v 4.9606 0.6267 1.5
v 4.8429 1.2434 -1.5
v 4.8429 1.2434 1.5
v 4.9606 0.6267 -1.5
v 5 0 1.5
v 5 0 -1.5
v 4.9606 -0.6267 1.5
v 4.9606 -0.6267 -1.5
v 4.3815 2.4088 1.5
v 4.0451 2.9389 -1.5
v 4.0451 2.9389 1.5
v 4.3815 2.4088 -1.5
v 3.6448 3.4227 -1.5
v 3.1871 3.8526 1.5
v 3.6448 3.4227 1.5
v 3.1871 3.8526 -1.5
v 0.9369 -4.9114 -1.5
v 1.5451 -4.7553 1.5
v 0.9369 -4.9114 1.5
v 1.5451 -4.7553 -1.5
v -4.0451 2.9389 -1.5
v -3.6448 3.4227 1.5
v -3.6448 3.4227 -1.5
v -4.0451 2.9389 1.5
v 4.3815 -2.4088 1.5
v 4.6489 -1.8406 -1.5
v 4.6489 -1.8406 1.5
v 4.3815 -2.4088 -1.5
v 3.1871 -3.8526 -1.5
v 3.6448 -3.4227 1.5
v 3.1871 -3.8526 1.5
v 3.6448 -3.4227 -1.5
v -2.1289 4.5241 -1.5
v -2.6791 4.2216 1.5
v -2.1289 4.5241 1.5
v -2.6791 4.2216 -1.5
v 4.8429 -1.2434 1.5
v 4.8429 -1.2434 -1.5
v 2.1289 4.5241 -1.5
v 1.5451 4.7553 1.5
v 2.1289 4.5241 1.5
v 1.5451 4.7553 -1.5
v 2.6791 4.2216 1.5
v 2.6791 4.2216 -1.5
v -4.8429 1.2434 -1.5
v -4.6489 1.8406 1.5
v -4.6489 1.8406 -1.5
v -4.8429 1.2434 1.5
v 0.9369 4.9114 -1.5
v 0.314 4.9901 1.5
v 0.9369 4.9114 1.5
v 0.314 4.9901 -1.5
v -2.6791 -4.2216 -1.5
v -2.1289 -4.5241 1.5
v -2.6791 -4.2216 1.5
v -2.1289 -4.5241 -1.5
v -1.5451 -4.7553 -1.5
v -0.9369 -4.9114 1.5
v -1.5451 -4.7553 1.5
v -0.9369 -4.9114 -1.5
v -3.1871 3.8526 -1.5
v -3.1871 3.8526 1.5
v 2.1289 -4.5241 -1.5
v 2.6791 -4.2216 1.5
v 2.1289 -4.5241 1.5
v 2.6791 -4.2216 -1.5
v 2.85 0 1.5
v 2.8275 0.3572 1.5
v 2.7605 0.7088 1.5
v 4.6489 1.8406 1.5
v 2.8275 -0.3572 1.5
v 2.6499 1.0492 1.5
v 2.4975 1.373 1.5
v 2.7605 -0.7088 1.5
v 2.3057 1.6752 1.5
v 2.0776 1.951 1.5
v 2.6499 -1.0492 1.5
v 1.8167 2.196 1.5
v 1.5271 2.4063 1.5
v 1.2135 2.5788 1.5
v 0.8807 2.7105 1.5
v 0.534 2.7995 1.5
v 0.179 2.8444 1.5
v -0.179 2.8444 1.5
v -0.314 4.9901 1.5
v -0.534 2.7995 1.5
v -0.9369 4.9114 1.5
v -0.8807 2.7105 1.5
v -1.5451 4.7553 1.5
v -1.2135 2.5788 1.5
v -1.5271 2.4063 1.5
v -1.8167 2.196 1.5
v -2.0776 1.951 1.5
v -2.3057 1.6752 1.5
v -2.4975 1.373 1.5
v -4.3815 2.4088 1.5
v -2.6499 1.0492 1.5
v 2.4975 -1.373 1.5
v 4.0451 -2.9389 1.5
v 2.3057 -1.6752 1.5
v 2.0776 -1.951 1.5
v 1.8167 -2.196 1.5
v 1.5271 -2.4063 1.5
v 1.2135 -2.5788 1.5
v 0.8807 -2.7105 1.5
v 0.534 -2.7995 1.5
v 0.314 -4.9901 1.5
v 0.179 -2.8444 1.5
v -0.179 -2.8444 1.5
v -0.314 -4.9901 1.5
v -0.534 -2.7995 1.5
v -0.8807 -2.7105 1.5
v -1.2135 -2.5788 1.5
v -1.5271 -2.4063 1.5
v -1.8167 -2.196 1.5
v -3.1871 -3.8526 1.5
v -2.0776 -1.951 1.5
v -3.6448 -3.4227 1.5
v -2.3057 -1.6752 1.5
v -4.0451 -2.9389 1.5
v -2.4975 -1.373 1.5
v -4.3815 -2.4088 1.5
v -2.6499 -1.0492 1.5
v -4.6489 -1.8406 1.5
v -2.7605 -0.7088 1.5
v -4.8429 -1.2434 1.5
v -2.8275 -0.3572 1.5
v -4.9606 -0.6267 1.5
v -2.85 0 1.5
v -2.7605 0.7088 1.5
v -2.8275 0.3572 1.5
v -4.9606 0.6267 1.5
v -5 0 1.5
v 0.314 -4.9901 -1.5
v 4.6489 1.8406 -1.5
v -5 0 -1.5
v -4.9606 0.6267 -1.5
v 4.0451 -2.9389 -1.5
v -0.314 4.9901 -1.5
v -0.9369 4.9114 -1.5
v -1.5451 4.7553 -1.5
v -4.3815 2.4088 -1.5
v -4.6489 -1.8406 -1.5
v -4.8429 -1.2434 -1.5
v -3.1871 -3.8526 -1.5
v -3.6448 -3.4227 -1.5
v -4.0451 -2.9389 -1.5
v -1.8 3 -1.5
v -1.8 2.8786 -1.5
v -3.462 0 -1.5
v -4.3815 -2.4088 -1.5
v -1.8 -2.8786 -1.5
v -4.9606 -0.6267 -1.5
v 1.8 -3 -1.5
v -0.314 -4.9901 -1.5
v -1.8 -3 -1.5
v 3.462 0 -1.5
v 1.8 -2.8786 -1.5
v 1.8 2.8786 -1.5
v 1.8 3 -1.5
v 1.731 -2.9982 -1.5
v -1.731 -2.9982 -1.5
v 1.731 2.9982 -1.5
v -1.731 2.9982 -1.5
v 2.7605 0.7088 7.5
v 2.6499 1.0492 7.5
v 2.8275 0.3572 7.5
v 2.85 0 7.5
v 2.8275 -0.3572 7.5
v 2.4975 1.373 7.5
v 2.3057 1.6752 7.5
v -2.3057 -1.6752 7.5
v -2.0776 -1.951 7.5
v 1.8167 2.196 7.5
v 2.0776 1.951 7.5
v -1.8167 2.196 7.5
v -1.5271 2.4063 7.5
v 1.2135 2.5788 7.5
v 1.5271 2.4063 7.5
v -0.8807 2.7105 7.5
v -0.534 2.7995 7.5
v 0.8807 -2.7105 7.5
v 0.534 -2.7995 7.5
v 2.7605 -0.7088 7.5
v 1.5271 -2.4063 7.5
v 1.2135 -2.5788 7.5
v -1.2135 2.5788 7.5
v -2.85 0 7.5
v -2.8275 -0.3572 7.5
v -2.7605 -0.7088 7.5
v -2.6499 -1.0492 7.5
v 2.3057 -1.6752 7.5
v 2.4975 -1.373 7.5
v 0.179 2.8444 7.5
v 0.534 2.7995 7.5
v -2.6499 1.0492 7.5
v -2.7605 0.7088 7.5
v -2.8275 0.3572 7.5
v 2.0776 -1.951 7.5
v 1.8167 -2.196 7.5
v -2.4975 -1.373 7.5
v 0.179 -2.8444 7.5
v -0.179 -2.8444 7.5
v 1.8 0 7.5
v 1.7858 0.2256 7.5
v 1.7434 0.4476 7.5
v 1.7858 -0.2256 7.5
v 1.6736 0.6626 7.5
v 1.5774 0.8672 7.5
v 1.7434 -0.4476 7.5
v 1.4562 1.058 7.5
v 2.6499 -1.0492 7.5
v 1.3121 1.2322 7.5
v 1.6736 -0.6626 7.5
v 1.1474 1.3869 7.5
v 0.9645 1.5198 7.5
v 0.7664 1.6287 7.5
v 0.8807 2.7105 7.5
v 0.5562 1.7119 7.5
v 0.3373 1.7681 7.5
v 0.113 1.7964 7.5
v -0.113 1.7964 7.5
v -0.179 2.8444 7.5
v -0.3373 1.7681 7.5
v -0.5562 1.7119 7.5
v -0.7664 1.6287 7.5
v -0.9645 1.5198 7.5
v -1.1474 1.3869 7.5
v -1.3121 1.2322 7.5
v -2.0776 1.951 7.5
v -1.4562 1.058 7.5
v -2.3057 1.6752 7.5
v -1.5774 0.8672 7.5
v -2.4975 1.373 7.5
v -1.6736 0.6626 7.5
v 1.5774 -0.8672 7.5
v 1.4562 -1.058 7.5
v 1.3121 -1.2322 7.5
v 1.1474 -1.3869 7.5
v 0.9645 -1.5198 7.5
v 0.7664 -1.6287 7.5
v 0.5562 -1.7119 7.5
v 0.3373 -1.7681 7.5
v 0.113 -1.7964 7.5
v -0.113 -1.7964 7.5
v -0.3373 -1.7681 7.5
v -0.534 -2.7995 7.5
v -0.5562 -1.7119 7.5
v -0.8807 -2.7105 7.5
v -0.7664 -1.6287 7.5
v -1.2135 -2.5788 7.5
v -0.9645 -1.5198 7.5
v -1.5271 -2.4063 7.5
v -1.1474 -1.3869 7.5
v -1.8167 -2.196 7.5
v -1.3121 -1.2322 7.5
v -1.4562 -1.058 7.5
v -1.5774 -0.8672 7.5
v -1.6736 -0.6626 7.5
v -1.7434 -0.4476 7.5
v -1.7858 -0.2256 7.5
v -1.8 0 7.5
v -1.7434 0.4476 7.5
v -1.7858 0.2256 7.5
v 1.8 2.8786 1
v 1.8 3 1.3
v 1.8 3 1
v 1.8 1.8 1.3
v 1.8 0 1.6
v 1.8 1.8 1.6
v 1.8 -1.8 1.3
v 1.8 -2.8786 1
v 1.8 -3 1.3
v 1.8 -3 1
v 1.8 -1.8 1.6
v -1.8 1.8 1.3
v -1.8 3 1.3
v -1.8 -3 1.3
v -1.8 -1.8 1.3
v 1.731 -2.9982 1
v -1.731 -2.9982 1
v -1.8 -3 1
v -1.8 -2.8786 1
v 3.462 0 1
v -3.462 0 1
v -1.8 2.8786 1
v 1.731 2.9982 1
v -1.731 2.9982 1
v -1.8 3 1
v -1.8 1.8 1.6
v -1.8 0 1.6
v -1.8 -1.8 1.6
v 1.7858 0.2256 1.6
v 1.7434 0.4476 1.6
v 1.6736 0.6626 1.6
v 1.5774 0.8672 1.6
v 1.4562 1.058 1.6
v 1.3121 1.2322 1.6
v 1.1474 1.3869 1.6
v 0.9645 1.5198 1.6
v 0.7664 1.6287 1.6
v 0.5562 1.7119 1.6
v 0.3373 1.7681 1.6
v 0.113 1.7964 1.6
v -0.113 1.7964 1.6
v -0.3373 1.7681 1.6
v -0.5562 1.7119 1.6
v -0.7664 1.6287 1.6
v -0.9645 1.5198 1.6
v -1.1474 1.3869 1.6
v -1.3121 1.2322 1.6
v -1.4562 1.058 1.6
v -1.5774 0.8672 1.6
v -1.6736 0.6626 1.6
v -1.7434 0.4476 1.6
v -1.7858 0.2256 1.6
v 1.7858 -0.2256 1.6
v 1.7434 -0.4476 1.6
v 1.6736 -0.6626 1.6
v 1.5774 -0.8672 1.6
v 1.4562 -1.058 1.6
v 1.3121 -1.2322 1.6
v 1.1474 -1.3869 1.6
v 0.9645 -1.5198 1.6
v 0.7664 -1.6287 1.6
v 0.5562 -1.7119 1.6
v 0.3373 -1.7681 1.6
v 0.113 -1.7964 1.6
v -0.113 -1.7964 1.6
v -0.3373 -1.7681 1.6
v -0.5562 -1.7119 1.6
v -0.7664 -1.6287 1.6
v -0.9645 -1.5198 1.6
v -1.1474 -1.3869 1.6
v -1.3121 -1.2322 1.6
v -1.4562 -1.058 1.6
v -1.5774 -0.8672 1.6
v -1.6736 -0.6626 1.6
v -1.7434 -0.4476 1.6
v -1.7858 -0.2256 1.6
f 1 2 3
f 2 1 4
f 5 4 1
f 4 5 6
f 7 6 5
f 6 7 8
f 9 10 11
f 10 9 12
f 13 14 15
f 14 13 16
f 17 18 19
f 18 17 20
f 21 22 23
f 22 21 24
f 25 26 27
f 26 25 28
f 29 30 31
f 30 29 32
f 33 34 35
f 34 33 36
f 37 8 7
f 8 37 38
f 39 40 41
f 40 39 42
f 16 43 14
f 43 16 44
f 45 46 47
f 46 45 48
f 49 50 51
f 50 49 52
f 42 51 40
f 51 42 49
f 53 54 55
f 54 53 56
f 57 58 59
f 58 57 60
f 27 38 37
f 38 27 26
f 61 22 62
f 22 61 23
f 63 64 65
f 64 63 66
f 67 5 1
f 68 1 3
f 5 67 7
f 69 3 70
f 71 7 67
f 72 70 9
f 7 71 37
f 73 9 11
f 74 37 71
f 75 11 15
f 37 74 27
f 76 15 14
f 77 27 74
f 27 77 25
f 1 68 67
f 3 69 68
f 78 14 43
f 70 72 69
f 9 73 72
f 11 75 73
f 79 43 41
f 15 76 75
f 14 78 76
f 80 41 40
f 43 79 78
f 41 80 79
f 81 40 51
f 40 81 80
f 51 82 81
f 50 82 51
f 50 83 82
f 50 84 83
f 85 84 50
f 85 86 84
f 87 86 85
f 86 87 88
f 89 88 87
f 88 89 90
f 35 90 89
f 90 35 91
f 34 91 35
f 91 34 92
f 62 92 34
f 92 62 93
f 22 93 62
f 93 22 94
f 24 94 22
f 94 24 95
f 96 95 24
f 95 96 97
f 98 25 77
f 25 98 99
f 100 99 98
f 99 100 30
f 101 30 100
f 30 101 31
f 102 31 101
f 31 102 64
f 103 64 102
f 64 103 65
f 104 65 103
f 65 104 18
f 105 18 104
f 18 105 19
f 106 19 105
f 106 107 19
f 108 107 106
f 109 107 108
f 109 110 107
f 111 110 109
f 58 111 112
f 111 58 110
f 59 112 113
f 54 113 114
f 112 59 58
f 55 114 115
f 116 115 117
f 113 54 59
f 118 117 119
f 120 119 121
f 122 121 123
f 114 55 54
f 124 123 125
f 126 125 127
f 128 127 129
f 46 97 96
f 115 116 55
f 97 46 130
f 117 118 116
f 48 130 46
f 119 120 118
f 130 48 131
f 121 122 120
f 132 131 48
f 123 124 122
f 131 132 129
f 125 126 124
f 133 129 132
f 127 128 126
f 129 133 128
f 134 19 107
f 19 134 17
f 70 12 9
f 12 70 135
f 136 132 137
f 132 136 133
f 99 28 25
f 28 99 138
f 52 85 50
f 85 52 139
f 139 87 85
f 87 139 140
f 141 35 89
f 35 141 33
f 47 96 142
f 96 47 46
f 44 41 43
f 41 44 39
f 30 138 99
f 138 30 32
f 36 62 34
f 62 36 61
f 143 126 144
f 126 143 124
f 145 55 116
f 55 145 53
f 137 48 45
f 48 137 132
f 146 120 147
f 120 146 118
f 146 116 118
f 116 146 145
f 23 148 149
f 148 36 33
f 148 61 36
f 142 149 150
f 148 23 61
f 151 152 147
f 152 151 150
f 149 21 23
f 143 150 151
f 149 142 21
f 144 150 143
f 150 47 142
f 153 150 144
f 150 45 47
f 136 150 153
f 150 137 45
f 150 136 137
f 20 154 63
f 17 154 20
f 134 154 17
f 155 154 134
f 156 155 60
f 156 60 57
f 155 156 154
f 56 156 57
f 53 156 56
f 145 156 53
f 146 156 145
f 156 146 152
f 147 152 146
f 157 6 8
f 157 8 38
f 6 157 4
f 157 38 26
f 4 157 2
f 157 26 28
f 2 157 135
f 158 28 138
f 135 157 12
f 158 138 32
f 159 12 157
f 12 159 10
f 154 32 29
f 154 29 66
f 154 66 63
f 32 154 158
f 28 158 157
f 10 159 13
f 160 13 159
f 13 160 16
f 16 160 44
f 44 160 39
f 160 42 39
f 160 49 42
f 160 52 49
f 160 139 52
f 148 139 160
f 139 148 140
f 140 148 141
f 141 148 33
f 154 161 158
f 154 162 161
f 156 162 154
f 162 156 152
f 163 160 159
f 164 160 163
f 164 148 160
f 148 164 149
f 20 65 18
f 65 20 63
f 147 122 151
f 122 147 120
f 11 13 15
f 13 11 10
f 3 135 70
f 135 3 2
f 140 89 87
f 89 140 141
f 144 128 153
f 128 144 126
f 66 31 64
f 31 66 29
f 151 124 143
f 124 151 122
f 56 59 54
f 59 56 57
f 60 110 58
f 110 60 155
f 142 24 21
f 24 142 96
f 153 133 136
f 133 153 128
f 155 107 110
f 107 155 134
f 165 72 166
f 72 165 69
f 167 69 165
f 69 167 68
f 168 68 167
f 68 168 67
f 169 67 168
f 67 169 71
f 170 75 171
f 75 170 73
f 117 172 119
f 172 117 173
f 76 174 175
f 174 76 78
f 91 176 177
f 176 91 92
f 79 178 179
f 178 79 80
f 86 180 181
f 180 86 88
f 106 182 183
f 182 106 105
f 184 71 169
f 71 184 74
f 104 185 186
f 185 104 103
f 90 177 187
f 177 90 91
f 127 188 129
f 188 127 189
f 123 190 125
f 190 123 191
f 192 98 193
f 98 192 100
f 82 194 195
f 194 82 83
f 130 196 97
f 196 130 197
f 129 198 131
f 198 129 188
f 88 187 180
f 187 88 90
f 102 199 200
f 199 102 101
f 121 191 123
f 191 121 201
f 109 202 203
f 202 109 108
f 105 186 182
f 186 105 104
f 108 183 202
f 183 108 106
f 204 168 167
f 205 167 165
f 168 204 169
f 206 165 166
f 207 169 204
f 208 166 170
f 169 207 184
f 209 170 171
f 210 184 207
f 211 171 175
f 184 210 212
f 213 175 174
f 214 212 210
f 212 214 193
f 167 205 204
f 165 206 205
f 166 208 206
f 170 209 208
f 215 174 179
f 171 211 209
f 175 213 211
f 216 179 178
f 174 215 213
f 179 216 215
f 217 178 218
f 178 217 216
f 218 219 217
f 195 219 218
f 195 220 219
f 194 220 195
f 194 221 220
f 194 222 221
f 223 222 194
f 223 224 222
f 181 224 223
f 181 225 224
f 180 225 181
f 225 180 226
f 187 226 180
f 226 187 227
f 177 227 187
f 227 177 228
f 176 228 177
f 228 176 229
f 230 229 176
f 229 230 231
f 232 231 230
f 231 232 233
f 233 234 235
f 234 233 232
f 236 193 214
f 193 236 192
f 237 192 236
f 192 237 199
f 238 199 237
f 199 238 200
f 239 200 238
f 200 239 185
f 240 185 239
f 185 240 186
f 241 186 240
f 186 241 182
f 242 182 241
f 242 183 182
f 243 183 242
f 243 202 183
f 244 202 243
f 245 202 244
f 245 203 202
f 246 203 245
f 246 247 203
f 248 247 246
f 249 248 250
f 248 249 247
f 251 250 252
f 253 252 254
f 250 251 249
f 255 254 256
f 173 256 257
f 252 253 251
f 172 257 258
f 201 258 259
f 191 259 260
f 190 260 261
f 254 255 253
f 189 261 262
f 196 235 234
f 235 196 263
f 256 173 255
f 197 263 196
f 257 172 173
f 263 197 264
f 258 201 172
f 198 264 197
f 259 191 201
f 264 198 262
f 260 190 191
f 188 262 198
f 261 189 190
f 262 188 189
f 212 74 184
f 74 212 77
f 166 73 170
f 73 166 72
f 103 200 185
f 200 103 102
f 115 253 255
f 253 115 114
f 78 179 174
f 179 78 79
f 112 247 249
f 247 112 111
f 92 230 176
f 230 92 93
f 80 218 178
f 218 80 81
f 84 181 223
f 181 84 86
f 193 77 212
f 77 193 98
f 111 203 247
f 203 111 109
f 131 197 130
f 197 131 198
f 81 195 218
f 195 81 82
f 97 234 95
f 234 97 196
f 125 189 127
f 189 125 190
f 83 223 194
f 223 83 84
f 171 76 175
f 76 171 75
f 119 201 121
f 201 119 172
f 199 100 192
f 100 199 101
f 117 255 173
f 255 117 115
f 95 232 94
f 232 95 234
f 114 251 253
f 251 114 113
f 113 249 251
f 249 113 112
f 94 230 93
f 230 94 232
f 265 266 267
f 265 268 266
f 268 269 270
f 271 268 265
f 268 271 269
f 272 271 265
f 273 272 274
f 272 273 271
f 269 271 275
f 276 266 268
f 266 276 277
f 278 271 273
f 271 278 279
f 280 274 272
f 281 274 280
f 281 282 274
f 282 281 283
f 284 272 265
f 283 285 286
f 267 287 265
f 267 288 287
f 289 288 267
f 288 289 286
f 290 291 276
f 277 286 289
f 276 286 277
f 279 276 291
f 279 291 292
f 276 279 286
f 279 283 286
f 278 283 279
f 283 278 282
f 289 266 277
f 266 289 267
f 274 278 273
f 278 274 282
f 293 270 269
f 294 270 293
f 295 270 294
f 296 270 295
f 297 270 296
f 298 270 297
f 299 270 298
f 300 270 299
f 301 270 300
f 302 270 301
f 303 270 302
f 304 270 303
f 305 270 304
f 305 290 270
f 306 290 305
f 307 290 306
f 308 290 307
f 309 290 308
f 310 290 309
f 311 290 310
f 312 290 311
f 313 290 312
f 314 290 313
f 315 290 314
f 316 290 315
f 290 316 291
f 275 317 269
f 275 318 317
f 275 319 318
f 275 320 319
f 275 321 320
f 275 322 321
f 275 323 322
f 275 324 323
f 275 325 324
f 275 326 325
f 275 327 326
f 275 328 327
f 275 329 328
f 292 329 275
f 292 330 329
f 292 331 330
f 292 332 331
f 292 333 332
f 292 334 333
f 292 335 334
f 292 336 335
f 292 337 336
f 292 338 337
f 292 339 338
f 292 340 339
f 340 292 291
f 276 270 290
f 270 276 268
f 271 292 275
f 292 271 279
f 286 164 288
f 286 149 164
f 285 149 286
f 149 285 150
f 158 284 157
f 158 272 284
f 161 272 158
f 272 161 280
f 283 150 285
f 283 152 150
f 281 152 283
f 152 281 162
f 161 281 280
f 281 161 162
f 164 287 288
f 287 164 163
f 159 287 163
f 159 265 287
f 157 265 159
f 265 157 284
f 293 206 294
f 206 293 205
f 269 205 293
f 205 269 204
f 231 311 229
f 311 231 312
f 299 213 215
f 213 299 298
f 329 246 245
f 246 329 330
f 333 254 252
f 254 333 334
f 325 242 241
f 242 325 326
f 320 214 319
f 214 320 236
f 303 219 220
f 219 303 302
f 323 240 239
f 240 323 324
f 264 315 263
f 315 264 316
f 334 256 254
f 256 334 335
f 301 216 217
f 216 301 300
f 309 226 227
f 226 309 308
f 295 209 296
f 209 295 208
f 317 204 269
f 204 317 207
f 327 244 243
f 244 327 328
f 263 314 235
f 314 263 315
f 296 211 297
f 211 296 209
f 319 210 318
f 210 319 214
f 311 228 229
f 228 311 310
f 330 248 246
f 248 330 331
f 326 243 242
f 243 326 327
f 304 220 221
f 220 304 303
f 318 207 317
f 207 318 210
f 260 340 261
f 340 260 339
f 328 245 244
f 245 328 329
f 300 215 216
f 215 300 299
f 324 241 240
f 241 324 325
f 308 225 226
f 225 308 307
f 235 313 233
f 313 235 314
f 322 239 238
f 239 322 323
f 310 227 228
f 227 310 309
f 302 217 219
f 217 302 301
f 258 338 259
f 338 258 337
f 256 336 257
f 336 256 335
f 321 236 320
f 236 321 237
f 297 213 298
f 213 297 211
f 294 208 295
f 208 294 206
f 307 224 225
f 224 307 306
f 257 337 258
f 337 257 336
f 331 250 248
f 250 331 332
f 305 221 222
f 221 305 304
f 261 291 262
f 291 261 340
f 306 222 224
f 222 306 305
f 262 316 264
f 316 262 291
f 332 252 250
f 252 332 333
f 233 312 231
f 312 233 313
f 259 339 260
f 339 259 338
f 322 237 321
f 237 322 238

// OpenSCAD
$fn = 50;


difference() {
	union() {
		translate(v = [0, 0, -1.5000000000]) {
			cylinder(h = 3, r = 5.0000000000);
		}
		translate(v = [0, 0, -1.5000000000]) {
			cylinder(h = 9, r = 2.8500000000);
		}
	}
	union() {
		translate(v = [0, 0, -1.5000000000]) {
			rotate(a = [0, 0, 0]) {
				difference() {
					union() {
						translate(v = [-1.8000000000, -3.0000000000, -0.3000000000]) {
							cube(size = [3.6000000000, 6.0000000000, 0.3000000000]);
						}
						translate(v = [-1.8000000000, -1.8000000000, -0.6000000000]) {
							cube(size = [3.6000000000, 3.6000000000, 0.3000000000]);
						}
						translate(v = [-1.8000000000, -3.0000000000, 2.5000000000]) {
							cube(size = [3.6000000000, 6.0000000000, 0.3000000000]);
						}
						translate(v = [-1.8000000000, -1.8000000000, 2.8000000000]) {
							cube(size = [3.6000000000, 3.6000000000, 0.3000000000]);
						}
						linear_extrude(height = 2.5000000000) {
							polygon(points = [[3.4620000000, 0.0000000000], [1.7310000000, 2.9981799479], [-1.7310000000, 2.9981799479], [-3.4620000000, 0.0000000000], [-1.7310000000, -2.9981799479], [1.7310000000, -2.9981799479]]);
						}
						translate(v = [-1.8000000000, -3.0000000000, -0.3000000000]) {
							cube(size = [3.6000000000, 6.0000000000, 0.3000000000]);
						}
						translate(v = [-1.8000000000, -1.8000000000, -0.6000000000]) {
							cube(size = [3.6000000000, 3.6000000000, 0.3000000000]);
						}
						translate(v = [-1.8000000000, -3.0000000000, 2.5000000000]) {
							cube(size = [3.6000000000, 6.0000000000, 0.3000000000]);
						}
						translate(v = [-1.8000000000, -1.8000000000, 2.8000000000]) {
							cube(size = [3.6000000000, 3.6000000000, 0.3000000000]);
						}
						translate(v = [-1.8000000000, -3.0000000000, -0.3000000000]) {
							cube(size = [3.6000000000, 6.0000000000, 0.3000000000]);
						}
						translate(v = [-1.8000000000, -1.8000000000, -0.6000000000]) {
							cube(size = [3.6000000000, 3.6000000000, 0.3000000000]);
						}
						translate(v = [-1.8000000000, -3.0000000000, 2.5000000000]) {
							cube(size = [3.6000000000, 6.0000000000, 0.3000000000]);
						}
						translate(v = [-1.8000000000, -1.8000000000, 2.8000000000]) {
							cube(size = [3.6000000000, 3.6000000000, 0.3000000000]);
						}
					}
					union();
				}
			}
		}
		translate(v = [0, 0, -50.0000000000]) {
			cylinder(h = 100, r = 1.8000000000);
		}
	}
}
